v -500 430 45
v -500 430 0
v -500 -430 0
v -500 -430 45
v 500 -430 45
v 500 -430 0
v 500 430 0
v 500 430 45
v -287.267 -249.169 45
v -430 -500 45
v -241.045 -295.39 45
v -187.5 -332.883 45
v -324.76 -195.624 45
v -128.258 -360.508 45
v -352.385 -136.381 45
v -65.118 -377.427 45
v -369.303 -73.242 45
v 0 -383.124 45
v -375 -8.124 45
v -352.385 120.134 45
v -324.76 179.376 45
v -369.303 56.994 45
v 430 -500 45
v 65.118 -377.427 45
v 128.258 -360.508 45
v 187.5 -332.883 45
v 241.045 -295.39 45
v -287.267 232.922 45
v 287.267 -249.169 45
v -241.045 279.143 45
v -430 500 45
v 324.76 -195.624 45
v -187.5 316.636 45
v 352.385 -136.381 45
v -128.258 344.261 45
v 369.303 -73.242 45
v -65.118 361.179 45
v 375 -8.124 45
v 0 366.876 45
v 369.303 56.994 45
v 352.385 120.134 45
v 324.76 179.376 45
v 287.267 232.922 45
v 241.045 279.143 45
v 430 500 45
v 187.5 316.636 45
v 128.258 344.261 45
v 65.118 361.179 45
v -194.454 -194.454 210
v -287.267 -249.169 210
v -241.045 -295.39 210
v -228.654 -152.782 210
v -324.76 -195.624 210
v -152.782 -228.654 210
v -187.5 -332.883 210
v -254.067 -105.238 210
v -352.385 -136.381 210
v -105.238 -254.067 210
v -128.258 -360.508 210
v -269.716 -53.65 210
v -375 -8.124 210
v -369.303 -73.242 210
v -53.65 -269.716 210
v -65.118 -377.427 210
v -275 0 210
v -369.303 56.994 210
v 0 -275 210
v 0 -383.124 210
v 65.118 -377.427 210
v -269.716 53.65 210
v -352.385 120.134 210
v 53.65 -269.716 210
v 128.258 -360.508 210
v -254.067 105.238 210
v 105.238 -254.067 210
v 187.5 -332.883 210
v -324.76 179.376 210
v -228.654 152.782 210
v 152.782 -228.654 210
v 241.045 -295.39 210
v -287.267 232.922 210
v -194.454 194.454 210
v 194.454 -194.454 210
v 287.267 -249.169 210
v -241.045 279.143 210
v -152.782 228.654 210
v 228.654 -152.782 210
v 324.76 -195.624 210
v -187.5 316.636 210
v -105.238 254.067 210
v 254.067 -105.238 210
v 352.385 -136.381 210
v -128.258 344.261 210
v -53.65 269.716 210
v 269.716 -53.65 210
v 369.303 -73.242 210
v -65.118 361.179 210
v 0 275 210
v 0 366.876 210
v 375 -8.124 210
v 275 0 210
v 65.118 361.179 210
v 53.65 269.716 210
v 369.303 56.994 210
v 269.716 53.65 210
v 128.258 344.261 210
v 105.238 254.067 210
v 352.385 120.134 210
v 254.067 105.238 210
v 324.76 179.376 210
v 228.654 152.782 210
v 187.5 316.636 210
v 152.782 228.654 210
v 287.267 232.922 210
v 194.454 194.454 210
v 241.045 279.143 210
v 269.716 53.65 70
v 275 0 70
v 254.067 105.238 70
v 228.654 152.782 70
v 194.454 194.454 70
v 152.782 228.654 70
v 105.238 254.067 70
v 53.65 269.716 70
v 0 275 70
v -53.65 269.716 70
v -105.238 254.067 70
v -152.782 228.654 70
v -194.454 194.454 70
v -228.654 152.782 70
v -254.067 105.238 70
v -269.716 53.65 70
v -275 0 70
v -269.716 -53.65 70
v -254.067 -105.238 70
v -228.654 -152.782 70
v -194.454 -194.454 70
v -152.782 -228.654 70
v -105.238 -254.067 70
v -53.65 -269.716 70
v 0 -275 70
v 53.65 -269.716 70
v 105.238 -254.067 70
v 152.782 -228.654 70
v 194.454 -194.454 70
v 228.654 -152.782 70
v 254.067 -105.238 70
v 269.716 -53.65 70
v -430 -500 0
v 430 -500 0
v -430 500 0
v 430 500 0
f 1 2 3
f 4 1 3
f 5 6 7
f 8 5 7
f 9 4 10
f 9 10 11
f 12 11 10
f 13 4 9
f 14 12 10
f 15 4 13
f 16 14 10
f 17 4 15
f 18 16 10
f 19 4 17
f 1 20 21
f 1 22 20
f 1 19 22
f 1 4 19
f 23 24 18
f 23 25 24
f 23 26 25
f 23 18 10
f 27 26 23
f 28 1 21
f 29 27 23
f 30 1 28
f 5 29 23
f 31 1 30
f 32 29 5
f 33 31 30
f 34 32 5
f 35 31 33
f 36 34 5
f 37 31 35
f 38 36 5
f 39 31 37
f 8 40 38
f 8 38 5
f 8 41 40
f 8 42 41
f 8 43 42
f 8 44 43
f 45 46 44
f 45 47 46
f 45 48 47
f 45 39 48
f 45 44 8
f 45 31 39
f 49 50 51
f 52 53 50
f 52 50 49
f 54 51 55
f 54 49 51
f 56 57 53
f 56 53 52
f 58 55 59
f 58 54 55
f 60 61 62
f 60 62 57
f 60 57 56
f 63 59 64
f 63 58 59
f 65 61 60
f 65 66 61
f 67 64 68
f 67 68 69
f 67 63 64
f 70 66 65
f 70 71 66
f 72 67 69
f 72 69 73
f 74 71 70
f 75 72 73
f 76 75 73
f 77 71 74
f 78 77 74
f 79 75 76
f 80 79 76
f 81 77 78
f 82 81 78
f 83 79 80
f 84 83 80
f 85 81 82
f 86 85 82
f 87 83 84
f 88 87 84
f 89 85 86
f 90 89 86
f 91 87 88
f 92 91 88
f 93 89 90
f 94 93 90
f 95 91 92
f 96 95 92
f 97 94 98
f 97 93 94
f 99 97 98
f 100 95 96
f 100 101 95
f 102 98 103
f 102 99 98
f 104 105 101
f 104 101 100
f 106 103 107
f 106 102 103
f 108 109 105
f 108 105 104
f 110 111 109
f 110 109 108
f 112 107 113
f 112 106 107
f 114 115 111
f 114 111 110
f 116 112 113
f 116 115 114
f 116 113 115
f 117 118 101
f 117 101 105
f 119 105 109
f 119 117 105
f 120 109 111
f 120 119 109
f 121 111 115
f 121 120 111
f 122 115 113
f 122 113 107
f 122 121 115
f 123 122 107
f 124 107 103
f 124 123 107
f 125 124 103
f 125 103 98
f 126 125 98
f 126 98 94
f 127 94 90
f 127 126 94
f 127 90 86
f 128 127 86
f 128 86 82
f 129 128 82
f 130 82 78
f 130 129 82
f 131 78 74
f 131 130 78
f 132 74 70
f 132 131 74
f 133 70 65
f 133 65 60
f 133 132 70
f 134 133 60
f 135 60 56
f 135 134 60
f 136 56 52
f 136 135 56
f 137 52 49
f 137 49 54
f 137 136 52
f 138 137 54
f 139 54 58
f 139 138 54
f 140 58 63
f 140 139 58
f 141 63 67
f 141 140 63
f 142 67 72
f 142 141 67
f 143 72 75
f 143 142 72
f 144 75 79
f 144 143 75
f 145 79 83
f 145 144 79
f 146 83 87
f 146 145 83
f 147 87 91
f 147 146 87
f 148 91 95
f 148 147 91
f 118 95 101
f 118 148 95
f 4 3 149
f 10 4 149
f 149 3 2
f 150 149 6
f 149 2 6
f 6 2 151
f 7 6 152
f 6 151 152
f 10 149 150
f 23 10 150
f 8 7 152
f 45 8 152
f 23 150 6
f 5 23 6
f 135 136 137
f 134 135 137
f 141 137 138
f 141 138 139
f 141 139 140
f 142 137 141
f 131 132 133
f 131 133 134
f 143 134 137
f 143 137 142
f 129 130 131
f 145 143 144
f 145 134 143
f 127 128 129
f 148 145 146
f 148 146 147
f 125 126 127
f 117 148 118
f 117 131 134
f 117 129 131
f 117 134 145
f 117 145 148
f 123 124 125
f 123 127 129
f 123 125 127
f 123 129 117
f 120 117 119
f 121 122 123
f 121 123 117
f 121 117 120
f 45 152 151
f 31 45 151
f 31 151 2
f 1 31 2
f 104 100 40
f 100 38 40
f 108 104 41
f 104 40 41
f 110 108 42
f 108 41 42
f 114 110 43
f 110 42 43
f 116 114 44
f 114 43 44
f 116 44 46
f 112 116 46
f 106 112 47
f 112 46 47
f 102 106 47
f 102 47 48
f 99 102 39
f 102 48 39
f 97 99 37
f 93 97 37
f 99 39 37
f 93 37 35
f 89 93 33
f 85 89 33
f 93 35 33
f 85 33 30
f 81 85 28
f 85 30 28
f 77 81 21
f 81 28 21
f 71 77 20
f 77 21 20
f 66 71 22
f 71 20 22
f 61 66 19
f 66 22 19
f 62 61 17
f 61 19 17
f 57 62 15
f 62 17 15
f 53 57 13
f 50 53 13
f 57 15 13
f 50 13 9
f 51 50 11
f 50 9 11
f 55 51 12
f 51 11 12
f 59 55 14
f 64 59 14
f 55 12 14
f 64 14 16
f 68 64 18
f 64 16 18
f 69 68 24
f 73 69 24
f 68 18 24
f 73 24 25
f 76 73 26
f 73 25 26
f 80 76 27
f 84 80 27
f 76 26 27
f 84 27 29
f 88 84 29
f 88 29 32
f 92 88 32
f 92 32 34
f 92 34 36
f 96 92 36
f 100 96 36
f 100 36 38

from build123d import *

# Parameters (mm, degrees)
F1_DEPTH = 45
F2_R     = 375
F3_DEPTH = 25
F4_R     = 375
F4_R_2   = 275
F5_DEPTH = 140


with BuildPart() as f1:
    # F0 (on Top) → F1 (new body)
    with BuildSketch(Plane.XY):
        Polygon((500, 430), (430, 500), (-430, 500), (-500, 430), (-500, -430), (-430, -500), (430, -500), (500, -430), align=None)
    extrude(amount=F1_DEPTH)

    # F2 (on face) → F3 (join)
    with BuildSketch(Plane.XY.offset(45)):
        with Locations((0, -8.12363)):
            Circle(F2_R)
    extrude(amount=F3_DEPTH)

    # F4 (on face) → F5 (join)
    with BuildSketch(Plane.XY.offset(70)):
        with Locations((0, -8.12363)):
            Circle(F4_R)
        Circle(F4_R_2, mode=Mode.SUBTRACT)
    extrude(amount=F5_DEPTH)


solid = f1.part
